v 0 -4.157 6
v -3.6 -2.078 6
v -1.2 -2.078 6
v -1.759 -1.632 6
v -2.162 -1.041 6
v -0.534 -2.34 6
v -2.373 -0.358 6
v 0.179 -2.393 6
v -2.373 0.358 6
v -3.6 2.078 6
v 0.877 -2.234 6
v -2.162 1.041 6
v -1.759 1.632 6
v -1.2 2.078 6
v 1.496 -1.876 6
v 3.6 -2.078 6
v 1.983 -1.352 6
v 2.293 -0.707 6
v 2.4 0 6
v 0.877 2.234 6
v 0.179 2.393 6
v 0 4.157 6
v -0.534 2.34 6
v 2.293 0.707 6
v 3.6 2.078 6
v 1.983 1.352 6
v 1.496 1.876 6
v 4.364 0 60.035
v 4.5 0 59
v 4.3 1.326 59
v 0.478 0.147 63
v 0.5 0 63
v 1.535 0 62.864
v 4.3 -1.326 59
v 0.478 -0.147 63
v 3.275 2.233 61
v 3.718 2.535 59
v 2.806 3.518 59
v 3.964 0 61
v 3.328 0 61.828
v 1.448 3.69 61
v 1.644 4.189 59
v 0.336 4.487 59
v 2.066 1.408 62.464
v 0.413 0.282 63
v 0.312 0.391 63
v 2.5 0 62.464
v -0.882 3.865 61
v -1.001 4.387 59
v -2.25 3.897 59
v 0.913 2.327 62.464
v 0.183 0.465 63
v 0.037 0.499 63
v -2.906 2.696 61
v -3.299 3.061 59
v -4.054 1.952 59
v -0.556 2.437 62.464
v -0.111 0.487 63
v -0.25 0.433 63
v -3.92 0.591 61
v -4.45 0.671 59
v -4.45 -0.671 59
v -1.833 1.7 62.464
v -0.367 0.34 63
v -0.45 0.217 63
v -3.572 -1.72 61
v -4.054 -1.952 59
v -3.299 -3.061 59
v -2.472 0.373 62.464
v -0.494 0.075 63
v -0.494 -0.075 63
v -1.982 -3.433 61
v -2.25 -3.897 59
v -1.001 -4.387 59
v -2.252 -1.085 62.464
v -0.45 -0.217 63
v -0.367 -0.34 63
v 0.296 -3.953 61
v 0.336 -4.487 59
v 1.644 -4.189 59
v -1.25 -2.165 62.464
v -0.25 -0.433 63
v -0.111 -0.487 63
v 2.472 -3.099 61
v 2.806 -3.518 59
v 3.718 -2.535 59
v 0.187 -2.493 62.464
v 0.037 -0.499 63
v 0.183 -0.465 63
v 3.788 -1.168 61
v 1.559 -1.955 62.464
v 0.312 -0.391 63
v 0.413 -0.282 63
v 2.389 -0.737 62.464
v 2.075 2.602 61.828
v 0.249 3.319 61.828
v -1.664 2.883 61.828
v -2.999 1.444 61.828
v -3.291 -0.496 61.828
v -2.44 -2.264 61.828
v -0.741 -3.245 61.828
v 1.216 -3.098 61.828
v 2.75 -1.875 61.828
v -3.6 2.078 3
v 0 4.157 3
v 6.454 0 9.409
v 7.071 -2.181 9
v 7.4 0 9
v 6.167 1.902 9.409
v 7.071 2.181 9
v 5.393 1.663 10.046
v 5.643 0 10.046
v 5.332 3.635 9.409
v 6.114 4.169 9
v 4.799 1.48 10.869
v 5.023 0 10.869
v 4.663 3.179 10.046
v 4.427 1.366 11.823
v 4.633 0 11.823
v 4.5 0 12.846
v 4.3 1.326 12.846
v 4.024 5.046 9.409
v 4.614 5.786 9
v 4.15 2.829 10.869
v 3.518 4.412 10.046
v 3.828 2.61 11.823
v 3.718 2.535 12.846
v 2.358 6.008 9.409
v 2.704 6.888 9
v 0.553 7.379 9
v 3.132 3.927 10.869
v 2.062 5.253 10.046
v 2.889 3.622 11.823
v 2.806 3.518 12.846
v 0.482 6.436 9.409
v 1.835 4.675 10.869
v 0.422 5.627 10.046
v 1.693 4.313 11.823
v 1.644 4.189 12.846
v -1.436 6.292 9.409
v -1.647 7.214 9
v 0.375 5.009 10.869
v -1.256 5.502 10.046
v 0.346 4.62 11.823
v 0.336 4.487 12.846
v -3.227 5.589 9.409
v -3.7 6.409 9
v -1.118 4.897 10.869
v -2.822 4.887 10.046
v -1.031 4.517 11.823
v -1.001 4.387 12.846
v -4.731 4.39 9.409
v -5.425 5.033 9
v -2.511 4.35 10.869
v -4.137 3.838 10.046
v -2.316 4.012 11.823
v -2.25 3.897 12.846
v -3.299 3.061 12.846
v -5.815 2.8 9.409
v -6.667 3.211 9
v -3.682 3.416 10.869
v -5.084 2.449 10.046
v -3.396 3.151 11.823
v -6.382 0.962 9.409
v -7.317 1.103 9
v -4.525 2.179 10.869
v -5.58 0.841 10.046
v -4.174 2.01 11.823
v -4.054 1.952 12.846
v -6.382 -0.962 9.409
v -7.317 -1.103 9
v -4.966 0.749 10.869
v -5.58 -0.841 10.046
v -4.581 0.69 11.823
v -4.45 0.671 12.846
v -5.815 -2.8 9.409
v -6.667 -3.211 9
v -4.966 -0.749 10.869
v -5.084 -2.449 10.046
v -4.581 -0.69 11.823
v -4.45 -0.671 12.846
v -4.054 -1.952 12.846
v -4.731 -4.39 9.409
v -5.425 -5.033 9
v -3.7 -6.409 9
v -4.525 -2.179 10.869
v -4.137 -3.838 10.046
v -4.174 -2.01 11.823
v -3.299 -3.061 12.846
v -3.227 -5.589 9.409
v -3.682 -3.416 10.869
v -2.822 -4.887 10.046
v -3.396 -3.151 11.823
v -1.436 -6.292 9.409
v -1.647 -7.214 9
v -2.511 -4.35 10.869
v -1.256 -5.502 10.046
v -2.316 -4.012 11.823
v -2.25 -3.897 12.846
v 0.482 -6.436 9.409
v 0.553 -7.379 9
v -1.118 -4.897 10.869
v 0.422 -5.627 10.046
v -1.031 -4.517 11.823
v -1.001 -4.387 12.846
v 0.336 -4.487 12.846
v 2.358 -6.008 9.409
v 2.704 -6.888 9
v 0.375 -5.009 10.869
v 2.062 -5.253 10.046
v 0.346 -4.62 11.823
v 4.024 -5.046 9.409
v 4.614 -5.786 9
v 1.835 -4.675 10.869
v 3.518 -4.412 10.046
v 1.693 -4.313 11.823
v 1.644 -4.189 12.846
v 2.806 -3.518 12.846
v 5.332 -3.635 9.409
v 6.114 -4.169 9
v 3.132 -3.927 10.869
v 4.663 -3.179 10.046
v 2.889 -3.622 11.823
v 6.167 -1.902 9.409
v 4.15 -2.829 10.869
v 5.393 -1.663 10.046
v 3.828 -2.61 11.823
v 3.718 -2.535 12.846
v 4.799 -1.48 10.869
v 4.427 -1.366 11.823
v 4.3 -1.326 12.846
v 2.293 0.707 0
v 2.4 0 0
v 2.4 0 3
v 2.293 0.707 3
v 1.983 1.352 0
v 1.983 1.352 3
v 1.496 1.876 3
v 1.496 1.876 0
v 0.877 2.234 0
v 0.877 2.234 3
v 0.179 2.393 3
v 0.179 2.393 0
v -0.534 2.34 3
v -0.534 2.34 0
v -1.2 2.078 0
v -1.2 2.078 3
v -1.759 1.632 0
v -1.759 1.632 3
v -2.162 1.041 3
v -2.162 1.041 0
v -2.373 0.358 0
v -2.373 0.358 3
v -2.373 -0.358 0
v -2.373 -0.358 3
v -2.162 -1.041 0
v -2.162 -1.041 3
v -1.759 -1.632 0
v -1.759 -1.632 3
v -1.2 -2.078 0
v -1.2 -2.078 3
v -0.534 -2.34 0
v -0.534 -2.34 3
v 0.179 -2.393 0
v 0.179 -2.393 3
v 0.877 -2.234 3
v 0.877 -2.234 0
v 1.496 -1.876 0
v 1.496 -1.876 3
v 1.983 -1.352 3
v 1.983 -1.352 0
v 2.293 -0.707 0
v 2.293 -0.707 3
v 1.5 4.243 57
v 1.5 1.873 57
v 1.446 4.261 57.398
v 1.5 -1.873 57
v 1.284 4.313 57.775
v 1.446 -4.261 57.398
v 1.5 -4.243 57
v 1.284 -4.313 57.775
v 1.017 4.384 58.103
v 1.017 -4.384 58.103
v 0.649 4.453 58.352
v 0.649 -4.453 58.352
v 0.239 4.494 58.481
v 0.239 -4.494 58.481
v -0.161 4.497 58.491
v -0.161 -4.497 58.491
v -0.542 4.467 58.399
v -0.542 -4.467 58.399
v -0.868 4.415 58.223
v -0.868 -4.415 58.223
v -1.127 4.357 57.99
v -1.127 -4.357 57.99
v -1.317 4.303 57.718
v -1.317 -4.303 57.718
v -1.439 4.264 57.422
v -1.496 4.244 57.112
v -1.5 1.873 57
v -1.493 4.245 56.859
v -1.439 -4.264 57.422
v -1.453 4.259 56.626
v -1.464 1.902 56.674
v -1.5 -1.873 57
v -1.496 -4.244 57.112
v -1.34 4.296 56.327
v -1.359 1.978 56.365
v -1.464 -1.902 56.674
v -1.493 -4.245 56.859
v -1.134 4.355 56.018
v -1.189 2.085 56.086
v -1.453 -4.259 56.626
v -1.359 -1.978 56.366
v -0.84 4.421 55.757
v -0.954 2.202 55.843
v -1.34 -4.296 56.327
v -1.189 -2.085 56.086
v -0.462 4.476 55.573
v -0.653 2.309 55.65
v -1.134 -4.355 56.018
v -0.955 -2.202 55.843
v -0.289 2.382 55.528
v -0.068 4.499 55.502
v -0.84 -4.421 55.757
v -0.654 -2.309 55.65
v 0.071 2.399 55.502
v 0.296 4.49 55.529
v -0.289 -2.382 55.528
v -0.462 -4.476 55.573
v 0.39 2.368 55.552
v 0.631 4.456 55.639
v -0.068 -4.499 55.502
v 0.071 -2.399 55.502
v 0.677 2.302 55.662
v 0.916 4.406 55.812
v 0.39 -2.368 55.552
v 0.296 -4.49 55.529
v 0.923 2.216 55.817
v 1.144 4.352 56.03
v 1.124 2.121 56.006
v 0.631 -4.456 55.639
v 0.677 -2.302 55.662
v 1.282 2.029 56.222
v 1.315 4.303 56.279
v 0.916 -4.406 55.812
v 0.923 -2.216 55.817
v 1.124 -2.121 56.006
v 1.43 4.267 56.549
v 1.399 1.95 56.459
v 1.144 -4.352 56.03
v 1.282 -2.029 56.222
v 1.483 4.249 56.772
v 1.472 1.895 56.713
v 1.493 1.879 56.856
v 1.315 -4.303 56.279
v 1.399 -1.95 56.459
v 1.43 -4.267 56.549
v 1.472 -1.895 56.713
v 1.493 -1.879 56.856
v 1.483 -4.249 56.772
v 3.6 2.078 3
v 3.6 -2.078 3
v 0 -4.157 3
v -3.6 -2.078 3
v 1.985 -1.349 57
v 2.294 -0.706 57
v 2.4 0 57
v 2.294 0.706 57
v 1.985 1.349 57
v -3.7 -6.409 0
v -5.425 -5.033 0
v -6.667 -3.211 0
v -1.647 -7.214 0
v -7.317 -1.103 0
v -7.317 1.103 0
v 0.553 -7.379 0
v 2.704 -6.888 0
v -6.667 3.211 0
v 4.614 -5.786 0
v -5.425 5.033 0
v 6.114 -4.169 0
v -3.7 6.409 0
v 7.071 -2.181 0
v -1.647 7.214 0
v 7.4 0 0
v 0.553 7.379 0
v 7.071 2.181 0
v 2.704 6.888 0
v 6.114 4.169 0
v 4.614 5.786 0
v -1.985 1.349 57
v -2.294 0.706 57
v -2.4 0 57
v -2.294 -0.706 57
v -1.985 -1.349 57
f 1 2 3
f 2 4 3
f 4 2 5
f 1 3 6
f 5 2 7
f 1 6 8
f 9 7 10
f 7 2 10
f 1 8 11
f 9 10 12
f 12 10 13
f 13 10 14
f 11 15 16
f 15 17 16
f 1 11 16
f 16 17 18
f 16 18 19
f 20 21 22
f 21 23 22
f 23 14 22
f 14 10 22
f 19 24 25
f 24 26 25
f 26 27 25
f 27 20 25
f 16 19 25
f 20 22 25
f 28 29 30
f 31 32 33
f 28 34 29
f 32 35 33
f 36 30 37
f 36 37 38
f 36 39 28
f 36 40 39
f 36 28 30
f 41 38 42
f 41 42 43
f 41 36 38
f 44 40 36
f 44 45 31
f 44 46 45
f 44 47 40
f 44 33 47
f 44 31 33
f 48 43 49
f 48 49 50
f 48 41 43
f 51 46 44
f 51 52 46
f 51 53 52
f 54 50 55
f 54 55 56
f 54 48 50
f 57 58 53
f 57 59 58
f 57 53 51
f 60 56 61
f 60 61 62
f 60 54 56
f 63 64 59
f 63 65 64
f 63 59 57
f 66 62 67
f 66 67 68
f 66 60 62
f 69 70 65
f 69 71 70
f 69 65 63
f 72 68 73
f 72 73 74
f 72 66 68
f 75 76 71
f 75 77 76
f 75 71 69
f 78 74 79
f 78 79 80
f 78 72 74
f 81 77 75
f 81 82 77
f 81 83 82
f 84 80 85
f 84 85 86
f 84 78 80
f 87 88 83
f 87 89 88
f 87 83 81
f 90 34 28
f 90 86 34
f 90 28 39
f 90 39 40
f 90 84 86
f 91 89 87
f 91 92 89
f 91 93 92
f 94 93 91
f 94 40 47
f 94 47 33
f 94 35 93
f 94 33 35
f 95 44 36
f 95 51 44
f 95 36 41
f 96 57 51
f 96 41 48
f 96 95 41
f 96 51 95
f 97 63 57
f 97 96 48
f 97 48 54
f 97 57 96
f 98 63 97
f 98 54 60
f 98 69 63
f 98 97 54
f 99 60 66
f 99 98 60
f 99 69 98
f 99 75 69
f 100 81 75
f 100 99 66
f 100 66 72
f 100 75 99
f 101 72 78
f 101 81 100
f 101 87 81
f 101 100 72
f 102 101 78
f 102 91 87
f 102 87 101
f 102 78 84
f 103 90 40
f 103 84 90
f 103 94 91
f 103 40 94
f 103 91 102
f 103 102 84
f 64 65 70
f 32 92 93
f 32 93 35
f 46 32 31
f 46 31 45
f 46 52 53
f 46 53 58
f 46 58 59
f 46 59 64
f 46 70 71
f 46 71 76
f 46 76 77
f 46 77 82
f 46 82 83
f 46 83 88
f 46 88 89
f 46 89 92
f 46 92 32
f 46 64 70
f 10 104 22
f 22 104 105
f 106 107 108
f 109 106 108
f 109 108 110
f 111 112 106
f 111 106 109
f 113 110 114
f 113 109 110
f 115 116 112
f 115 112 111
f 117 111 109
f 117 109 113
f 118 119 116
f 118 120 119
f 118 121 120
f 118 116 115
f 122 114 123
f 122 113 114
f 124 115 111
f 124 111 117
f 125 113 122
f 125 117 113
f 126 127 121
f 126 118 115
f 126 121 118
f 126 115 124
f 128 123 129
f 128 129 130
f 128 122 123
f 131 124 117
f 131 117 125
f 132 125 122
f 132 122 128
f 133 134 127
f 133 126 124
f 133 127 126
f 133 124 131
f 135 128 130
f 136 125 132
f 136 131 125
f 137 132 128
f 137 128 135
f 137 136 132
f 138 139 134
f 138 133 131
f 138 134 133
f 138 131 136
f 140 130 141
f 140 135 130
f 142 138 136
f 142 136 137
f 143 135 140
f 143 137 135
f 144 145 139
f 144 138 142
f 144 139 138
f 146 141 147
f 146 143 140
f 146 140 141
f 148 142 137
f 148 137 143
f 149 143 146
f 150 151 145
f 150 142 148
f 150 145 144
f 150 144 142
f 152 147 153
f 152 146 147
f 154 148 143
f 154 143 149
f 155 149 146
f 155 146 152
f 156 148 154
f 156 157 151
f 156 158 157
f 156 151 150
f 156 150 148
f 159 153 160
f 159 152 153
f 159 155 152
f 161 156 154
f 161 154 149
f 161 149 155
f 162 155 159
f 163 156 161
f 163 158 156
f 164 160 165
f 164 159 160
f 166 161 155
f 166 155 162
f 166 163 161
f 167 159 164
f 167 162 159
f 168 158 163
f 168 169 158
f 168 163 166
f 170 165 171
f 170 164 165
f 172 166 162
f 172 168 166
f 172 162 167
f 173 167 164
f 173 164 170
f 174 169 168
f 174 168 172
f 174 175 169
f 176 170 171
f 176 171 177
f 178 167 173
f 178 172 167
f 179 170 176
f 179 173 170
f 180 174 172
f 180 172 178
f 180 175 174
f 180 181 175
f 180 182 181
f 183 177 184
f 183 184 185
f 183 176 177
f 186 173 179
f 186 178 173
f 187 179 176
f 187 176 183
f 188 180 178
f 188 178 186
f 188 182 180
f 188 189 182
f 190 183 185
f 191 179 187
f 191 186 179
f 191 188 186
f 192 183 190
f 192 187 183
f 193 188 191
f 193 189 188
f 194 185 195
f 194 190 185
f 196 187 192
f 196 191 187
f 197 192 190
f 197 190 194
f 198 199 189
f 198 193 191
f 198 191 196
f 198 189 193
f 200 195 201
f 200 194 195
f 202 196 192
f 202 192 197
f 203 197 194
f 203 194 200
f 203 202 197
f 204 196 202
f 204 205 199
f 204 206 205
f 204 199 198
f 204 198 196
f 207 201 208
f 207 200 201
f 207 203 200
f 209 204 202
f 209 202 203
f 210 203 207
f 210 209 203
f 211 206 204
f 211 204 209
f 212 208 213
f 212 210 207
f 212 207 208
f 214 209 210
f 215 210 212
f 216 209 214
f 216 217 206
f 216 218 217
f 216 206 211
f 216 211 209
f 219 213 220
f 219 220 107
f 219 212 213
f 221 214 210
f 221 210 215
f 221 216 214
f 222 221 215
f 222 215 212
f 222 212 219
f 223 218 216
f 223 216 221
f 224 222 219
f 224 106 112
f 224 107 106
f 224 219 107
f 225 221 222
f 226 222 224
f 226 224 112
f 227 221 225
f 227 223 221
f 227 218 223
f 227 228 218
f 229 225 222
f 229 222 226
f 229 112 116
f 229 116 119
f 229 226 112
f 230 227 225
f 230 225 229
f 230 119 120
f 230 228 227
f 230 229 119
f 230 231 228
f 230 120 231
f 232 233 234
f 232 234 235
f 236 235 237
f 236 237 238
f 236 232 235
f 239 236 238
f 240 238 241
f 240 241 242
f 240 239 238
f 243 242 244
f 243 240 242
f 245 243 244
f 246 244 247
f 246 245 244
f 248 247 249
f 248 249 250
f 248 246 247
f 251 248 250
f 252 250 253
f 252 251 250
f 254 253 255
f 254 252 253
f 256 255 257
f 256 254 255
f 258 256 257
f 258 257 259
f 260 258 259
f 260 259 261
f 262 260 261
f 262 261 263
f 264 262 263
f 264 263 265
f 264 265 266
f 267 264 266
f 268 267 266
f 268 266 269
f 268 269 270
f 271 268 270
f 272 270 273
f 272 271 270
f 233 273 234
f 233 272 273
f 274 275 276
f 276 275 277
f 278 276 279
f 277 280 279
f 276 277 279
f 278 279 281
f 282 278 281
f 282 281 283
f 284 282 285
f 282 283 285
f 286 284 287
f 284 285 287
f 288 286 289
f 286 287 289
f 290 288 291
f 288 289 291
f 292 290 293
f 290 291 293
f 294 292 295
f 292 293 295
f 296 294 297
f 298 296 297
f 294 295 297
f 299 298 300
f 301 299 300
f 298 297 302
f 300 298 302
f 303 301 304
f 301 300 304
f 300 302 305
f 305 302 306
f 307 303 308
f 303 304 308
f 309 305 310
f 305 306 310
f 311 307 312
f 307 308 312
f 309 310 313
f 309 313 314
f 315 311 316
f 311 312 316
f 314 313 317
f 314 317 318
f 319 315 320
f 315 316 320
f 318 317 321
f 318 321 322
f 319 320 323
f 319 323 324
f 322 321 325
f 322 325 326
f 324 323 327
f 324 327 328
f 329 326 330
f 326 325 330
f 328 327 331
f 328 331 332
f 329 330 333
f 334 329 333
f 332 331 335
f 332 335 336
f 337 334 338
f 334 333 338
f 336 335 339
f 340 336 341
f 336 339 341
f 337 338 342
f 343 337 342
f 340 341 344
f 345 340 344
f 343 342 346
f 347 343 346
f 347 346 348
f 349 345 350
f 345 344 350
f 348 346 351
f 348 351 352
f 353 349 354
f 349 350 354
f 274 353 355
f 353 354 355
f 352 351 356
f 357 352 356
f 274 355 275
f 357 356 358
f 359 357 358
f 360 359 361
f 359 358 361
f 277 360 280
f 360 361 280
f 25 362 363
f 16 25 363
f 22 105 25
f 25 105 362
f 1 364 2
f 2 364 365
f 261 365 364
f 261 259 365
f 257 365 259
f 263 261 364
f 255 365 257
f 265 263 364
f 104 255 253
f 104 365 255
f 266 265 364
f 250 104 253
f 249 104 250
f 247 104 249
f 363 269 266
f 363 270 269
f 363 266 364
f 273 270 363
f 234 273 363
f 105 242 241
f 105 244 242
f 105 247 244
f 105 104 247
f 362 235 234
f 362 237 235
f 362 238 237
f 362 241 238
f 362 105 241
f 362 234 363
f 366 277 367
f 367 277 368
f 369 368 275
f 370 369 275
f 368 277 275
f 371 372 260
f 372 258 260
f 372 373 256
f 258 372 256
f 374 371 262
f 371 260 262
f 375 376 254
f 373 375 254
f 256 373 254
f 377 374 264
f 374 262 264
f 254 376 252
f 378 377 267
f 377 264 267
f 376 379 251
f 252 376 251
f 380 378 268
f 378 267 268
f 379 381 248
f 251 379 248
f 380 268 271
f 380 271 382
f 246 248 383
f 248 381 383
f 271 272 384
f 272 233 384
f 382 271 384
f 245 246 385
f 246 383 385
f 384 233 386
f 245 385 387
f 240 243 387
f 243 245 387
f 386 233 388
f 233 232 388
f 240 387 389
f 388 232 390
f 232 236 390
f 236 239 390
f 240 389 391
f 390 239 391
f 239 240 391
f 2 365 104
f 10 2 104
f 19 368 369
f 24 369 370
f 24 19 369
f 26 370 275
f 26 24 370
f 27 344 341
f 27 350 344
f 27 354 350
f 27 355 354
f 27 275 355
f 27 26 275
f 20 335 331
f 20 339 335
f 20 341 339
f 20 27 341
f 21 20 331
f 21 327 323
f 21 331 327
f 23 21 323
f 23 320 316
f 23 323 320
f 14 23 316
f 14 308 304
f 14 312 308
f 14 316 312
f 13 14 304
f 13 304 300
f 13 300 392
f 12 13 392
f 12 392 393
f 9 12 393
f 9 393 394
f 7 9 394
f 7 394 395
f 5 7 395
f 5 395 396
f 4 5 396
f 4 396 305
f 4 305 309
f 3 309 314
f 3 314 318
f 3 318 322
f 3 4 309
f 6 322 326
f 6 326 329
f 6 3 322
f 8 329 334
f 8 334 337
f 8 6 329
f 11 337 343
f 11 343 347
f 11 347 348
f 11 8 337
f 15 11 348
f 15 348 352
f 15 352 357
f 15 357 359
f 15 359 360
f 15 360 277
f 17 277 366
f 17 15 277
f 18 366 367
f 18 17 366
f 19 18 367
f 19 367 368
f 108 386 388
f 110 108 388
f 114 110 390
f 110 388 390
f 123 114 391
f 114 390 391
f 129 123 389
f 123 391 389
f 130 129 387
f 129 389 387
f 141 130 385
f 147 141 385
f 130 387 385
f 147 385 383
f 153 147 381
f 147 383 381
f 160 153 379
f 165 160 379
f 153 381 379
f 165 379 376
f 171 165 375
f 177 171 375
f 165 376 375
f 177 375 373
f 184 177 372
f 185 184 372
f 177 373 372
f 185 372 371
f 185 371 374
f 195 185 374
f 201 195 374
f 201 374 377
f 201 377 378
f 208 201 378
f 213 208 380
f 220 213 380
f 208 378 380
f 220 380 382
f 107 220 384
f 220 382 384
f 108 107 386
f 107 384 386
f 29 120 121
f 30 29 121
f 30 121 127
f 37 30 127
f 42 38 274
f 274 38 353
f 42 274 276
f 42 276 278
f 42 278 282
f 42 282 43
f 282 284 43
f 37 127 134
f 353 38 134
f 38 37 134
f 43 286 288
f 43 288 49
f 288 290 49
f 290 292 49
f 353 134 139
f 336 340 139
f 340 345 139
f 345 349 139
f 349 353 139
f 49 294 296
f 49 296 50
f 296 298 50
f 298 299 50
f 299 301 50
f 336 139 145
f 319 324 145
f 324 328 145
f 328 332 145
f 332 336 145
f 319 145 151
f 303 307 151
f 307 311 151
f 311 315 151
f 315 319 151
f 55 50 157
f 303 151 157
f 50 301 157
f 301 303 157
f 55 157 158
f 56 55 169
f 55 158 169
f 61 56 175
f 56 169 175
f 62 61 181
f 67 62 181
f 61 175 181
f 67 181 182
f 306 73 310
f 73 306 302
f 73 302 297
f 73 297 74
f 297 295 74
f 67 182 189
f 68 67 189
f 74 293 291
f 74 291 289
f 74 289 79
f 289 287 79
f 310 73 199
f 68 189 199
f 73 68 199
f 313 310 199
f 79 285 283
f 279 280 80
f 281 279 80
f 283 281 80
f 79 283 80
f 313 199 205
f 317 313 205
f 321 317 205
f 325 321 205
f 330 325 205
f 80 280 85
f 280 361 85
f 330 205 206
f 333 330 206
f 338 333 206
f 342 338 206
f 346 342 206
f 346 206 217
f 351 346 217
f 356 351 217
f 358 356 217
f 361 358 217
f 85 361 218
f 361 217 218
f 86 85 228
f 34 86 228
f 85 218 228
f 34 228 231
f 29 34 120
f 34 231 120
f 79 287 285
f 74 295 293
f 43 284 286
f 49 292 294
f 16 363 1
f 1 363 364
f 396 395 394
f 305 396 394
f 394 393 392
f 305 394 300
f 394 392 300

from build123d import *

# Parameters (mm, degrees)
F0_R      = 7.4
F0_R_2    = 2.4
F1_DEPTH  = 3
F2_R      = 7.4
F3_DEPTH  = 3
F4_R      = 4.5
F4_R_2    = 2.4
F5_DEPTH  = 51
F6_DEPTH  = 3
F7_R      = 4.5
F8_DEPTH  = 6
F10_R     = 1.5
F11_DEPTH = 12.5


# Not quite as in the source:
# - a fillet or chamfer that OpenCascade refuses, or shapes differently, is made with other operations: its cross-section is extruded or revolved along the edge and cut away or added


with BuildPart() as f1:
    # F0 (on Top) → F1 (new body)
    with BuildSketch(Plane.XY):
        Circle(F0_R)
        Circle(F0_R_2, mode=Mode.SUBTRACT)
    extrude(amount=F1_DEPTH)

    # F2 (on face) → F3 (join)
    with BuildSketch(Plane.XY.offset(3)):
        Circle(F2_R)
        Polygon((0, 4.1569219382), (3.6, 2.0784609691), (3.6, -2.0784609691), (0, -4.1569219382), (-3.6, -2.0784609691), (-3.6, 2.0784609691), align=None, mode=Mode.SUBTRACT)
    extrude(amount=F3_DEPTH)

    # F4 (on face) → F5 (join)
    with BuildSketch(Plane.XY.offset(6)):
        Circle(F4_R)
        Polygon((-3.6, -2.0784609691), (-3.6, 2.0784609691), (0, 4.1569219382), (3.6, 2.0784609691), (3.6, -2.0784609691), (0, -4.1569219382), align=None, mode=Mode.SUBTRACT)
        Polygon((0, 4.1569219382), (-3.6, 2.0784609691), (-3.6, -2.0784609691), (0, -4.1569219382), (3.6, -2.0784609691), (3.6, 2.0784609691), align=None)
        Circle(F4_R_2, mode=Mode.SUBTRACT)
    extrude(amount=F5_DEPTH)

    # F6 (add): a face of the model
    f6_faces = [f1.faces().sort_by_distance(p)[0] for p in [
        (-7.1906963928, 0, 6),
    ]]
    extrude(f6_faces, amount=F6_DEPTH)

    # F7 (on face) → F8 (join)
    with BuildSketch(Plane.XY.offset(57)):
        Circle(F7_R)
    extrude(amount=F8_DEPTH)

    # F9: fillet of radius 4 on 2 edges, made by hand

    # F9_s1 → F9_t2 (revolve)
    with BuildSketch(Plane.XZ):
        with BuildLine():
            ThreePointArc((7.4, 9), (5.3062561155, 10.4374579888), (4.5, 12.8457769046))
            Line((4.5, 12.8457769046), (4.5, 9))
            Line((4.5, 9), (7.4, 9))
        make_face()
    revolve(axis=Axis((0, 0, 9), (0, 0, 1)))

    # F9_s3 → F9_t4 (revolve, cut)
    with BuildSketch(Plane.XZ):
        with BuildLine():
            ThreePointArc((4.5, 59), (3.3284271247, 61.8284271247), (0.5, 63))
            Line((0.5, 63), (4.5, 63))
            Line((4.5, 63), (4.5, 59))
        make_face()
    revolve(axis=Axis((0, 0, 63), (0, 0, 1)), mode=Mode.SUBTRACT)

    # F10 (on Front) → F11 (cut, symmetric)
    with BuildSketch(Plane.XZ):
        with Locations((0, 57)):
            Circle(F10_R)
    extrude(amount=F11_DEPTH, both=True, mode=Mode.SUBTRACT)


solid = f1.part
